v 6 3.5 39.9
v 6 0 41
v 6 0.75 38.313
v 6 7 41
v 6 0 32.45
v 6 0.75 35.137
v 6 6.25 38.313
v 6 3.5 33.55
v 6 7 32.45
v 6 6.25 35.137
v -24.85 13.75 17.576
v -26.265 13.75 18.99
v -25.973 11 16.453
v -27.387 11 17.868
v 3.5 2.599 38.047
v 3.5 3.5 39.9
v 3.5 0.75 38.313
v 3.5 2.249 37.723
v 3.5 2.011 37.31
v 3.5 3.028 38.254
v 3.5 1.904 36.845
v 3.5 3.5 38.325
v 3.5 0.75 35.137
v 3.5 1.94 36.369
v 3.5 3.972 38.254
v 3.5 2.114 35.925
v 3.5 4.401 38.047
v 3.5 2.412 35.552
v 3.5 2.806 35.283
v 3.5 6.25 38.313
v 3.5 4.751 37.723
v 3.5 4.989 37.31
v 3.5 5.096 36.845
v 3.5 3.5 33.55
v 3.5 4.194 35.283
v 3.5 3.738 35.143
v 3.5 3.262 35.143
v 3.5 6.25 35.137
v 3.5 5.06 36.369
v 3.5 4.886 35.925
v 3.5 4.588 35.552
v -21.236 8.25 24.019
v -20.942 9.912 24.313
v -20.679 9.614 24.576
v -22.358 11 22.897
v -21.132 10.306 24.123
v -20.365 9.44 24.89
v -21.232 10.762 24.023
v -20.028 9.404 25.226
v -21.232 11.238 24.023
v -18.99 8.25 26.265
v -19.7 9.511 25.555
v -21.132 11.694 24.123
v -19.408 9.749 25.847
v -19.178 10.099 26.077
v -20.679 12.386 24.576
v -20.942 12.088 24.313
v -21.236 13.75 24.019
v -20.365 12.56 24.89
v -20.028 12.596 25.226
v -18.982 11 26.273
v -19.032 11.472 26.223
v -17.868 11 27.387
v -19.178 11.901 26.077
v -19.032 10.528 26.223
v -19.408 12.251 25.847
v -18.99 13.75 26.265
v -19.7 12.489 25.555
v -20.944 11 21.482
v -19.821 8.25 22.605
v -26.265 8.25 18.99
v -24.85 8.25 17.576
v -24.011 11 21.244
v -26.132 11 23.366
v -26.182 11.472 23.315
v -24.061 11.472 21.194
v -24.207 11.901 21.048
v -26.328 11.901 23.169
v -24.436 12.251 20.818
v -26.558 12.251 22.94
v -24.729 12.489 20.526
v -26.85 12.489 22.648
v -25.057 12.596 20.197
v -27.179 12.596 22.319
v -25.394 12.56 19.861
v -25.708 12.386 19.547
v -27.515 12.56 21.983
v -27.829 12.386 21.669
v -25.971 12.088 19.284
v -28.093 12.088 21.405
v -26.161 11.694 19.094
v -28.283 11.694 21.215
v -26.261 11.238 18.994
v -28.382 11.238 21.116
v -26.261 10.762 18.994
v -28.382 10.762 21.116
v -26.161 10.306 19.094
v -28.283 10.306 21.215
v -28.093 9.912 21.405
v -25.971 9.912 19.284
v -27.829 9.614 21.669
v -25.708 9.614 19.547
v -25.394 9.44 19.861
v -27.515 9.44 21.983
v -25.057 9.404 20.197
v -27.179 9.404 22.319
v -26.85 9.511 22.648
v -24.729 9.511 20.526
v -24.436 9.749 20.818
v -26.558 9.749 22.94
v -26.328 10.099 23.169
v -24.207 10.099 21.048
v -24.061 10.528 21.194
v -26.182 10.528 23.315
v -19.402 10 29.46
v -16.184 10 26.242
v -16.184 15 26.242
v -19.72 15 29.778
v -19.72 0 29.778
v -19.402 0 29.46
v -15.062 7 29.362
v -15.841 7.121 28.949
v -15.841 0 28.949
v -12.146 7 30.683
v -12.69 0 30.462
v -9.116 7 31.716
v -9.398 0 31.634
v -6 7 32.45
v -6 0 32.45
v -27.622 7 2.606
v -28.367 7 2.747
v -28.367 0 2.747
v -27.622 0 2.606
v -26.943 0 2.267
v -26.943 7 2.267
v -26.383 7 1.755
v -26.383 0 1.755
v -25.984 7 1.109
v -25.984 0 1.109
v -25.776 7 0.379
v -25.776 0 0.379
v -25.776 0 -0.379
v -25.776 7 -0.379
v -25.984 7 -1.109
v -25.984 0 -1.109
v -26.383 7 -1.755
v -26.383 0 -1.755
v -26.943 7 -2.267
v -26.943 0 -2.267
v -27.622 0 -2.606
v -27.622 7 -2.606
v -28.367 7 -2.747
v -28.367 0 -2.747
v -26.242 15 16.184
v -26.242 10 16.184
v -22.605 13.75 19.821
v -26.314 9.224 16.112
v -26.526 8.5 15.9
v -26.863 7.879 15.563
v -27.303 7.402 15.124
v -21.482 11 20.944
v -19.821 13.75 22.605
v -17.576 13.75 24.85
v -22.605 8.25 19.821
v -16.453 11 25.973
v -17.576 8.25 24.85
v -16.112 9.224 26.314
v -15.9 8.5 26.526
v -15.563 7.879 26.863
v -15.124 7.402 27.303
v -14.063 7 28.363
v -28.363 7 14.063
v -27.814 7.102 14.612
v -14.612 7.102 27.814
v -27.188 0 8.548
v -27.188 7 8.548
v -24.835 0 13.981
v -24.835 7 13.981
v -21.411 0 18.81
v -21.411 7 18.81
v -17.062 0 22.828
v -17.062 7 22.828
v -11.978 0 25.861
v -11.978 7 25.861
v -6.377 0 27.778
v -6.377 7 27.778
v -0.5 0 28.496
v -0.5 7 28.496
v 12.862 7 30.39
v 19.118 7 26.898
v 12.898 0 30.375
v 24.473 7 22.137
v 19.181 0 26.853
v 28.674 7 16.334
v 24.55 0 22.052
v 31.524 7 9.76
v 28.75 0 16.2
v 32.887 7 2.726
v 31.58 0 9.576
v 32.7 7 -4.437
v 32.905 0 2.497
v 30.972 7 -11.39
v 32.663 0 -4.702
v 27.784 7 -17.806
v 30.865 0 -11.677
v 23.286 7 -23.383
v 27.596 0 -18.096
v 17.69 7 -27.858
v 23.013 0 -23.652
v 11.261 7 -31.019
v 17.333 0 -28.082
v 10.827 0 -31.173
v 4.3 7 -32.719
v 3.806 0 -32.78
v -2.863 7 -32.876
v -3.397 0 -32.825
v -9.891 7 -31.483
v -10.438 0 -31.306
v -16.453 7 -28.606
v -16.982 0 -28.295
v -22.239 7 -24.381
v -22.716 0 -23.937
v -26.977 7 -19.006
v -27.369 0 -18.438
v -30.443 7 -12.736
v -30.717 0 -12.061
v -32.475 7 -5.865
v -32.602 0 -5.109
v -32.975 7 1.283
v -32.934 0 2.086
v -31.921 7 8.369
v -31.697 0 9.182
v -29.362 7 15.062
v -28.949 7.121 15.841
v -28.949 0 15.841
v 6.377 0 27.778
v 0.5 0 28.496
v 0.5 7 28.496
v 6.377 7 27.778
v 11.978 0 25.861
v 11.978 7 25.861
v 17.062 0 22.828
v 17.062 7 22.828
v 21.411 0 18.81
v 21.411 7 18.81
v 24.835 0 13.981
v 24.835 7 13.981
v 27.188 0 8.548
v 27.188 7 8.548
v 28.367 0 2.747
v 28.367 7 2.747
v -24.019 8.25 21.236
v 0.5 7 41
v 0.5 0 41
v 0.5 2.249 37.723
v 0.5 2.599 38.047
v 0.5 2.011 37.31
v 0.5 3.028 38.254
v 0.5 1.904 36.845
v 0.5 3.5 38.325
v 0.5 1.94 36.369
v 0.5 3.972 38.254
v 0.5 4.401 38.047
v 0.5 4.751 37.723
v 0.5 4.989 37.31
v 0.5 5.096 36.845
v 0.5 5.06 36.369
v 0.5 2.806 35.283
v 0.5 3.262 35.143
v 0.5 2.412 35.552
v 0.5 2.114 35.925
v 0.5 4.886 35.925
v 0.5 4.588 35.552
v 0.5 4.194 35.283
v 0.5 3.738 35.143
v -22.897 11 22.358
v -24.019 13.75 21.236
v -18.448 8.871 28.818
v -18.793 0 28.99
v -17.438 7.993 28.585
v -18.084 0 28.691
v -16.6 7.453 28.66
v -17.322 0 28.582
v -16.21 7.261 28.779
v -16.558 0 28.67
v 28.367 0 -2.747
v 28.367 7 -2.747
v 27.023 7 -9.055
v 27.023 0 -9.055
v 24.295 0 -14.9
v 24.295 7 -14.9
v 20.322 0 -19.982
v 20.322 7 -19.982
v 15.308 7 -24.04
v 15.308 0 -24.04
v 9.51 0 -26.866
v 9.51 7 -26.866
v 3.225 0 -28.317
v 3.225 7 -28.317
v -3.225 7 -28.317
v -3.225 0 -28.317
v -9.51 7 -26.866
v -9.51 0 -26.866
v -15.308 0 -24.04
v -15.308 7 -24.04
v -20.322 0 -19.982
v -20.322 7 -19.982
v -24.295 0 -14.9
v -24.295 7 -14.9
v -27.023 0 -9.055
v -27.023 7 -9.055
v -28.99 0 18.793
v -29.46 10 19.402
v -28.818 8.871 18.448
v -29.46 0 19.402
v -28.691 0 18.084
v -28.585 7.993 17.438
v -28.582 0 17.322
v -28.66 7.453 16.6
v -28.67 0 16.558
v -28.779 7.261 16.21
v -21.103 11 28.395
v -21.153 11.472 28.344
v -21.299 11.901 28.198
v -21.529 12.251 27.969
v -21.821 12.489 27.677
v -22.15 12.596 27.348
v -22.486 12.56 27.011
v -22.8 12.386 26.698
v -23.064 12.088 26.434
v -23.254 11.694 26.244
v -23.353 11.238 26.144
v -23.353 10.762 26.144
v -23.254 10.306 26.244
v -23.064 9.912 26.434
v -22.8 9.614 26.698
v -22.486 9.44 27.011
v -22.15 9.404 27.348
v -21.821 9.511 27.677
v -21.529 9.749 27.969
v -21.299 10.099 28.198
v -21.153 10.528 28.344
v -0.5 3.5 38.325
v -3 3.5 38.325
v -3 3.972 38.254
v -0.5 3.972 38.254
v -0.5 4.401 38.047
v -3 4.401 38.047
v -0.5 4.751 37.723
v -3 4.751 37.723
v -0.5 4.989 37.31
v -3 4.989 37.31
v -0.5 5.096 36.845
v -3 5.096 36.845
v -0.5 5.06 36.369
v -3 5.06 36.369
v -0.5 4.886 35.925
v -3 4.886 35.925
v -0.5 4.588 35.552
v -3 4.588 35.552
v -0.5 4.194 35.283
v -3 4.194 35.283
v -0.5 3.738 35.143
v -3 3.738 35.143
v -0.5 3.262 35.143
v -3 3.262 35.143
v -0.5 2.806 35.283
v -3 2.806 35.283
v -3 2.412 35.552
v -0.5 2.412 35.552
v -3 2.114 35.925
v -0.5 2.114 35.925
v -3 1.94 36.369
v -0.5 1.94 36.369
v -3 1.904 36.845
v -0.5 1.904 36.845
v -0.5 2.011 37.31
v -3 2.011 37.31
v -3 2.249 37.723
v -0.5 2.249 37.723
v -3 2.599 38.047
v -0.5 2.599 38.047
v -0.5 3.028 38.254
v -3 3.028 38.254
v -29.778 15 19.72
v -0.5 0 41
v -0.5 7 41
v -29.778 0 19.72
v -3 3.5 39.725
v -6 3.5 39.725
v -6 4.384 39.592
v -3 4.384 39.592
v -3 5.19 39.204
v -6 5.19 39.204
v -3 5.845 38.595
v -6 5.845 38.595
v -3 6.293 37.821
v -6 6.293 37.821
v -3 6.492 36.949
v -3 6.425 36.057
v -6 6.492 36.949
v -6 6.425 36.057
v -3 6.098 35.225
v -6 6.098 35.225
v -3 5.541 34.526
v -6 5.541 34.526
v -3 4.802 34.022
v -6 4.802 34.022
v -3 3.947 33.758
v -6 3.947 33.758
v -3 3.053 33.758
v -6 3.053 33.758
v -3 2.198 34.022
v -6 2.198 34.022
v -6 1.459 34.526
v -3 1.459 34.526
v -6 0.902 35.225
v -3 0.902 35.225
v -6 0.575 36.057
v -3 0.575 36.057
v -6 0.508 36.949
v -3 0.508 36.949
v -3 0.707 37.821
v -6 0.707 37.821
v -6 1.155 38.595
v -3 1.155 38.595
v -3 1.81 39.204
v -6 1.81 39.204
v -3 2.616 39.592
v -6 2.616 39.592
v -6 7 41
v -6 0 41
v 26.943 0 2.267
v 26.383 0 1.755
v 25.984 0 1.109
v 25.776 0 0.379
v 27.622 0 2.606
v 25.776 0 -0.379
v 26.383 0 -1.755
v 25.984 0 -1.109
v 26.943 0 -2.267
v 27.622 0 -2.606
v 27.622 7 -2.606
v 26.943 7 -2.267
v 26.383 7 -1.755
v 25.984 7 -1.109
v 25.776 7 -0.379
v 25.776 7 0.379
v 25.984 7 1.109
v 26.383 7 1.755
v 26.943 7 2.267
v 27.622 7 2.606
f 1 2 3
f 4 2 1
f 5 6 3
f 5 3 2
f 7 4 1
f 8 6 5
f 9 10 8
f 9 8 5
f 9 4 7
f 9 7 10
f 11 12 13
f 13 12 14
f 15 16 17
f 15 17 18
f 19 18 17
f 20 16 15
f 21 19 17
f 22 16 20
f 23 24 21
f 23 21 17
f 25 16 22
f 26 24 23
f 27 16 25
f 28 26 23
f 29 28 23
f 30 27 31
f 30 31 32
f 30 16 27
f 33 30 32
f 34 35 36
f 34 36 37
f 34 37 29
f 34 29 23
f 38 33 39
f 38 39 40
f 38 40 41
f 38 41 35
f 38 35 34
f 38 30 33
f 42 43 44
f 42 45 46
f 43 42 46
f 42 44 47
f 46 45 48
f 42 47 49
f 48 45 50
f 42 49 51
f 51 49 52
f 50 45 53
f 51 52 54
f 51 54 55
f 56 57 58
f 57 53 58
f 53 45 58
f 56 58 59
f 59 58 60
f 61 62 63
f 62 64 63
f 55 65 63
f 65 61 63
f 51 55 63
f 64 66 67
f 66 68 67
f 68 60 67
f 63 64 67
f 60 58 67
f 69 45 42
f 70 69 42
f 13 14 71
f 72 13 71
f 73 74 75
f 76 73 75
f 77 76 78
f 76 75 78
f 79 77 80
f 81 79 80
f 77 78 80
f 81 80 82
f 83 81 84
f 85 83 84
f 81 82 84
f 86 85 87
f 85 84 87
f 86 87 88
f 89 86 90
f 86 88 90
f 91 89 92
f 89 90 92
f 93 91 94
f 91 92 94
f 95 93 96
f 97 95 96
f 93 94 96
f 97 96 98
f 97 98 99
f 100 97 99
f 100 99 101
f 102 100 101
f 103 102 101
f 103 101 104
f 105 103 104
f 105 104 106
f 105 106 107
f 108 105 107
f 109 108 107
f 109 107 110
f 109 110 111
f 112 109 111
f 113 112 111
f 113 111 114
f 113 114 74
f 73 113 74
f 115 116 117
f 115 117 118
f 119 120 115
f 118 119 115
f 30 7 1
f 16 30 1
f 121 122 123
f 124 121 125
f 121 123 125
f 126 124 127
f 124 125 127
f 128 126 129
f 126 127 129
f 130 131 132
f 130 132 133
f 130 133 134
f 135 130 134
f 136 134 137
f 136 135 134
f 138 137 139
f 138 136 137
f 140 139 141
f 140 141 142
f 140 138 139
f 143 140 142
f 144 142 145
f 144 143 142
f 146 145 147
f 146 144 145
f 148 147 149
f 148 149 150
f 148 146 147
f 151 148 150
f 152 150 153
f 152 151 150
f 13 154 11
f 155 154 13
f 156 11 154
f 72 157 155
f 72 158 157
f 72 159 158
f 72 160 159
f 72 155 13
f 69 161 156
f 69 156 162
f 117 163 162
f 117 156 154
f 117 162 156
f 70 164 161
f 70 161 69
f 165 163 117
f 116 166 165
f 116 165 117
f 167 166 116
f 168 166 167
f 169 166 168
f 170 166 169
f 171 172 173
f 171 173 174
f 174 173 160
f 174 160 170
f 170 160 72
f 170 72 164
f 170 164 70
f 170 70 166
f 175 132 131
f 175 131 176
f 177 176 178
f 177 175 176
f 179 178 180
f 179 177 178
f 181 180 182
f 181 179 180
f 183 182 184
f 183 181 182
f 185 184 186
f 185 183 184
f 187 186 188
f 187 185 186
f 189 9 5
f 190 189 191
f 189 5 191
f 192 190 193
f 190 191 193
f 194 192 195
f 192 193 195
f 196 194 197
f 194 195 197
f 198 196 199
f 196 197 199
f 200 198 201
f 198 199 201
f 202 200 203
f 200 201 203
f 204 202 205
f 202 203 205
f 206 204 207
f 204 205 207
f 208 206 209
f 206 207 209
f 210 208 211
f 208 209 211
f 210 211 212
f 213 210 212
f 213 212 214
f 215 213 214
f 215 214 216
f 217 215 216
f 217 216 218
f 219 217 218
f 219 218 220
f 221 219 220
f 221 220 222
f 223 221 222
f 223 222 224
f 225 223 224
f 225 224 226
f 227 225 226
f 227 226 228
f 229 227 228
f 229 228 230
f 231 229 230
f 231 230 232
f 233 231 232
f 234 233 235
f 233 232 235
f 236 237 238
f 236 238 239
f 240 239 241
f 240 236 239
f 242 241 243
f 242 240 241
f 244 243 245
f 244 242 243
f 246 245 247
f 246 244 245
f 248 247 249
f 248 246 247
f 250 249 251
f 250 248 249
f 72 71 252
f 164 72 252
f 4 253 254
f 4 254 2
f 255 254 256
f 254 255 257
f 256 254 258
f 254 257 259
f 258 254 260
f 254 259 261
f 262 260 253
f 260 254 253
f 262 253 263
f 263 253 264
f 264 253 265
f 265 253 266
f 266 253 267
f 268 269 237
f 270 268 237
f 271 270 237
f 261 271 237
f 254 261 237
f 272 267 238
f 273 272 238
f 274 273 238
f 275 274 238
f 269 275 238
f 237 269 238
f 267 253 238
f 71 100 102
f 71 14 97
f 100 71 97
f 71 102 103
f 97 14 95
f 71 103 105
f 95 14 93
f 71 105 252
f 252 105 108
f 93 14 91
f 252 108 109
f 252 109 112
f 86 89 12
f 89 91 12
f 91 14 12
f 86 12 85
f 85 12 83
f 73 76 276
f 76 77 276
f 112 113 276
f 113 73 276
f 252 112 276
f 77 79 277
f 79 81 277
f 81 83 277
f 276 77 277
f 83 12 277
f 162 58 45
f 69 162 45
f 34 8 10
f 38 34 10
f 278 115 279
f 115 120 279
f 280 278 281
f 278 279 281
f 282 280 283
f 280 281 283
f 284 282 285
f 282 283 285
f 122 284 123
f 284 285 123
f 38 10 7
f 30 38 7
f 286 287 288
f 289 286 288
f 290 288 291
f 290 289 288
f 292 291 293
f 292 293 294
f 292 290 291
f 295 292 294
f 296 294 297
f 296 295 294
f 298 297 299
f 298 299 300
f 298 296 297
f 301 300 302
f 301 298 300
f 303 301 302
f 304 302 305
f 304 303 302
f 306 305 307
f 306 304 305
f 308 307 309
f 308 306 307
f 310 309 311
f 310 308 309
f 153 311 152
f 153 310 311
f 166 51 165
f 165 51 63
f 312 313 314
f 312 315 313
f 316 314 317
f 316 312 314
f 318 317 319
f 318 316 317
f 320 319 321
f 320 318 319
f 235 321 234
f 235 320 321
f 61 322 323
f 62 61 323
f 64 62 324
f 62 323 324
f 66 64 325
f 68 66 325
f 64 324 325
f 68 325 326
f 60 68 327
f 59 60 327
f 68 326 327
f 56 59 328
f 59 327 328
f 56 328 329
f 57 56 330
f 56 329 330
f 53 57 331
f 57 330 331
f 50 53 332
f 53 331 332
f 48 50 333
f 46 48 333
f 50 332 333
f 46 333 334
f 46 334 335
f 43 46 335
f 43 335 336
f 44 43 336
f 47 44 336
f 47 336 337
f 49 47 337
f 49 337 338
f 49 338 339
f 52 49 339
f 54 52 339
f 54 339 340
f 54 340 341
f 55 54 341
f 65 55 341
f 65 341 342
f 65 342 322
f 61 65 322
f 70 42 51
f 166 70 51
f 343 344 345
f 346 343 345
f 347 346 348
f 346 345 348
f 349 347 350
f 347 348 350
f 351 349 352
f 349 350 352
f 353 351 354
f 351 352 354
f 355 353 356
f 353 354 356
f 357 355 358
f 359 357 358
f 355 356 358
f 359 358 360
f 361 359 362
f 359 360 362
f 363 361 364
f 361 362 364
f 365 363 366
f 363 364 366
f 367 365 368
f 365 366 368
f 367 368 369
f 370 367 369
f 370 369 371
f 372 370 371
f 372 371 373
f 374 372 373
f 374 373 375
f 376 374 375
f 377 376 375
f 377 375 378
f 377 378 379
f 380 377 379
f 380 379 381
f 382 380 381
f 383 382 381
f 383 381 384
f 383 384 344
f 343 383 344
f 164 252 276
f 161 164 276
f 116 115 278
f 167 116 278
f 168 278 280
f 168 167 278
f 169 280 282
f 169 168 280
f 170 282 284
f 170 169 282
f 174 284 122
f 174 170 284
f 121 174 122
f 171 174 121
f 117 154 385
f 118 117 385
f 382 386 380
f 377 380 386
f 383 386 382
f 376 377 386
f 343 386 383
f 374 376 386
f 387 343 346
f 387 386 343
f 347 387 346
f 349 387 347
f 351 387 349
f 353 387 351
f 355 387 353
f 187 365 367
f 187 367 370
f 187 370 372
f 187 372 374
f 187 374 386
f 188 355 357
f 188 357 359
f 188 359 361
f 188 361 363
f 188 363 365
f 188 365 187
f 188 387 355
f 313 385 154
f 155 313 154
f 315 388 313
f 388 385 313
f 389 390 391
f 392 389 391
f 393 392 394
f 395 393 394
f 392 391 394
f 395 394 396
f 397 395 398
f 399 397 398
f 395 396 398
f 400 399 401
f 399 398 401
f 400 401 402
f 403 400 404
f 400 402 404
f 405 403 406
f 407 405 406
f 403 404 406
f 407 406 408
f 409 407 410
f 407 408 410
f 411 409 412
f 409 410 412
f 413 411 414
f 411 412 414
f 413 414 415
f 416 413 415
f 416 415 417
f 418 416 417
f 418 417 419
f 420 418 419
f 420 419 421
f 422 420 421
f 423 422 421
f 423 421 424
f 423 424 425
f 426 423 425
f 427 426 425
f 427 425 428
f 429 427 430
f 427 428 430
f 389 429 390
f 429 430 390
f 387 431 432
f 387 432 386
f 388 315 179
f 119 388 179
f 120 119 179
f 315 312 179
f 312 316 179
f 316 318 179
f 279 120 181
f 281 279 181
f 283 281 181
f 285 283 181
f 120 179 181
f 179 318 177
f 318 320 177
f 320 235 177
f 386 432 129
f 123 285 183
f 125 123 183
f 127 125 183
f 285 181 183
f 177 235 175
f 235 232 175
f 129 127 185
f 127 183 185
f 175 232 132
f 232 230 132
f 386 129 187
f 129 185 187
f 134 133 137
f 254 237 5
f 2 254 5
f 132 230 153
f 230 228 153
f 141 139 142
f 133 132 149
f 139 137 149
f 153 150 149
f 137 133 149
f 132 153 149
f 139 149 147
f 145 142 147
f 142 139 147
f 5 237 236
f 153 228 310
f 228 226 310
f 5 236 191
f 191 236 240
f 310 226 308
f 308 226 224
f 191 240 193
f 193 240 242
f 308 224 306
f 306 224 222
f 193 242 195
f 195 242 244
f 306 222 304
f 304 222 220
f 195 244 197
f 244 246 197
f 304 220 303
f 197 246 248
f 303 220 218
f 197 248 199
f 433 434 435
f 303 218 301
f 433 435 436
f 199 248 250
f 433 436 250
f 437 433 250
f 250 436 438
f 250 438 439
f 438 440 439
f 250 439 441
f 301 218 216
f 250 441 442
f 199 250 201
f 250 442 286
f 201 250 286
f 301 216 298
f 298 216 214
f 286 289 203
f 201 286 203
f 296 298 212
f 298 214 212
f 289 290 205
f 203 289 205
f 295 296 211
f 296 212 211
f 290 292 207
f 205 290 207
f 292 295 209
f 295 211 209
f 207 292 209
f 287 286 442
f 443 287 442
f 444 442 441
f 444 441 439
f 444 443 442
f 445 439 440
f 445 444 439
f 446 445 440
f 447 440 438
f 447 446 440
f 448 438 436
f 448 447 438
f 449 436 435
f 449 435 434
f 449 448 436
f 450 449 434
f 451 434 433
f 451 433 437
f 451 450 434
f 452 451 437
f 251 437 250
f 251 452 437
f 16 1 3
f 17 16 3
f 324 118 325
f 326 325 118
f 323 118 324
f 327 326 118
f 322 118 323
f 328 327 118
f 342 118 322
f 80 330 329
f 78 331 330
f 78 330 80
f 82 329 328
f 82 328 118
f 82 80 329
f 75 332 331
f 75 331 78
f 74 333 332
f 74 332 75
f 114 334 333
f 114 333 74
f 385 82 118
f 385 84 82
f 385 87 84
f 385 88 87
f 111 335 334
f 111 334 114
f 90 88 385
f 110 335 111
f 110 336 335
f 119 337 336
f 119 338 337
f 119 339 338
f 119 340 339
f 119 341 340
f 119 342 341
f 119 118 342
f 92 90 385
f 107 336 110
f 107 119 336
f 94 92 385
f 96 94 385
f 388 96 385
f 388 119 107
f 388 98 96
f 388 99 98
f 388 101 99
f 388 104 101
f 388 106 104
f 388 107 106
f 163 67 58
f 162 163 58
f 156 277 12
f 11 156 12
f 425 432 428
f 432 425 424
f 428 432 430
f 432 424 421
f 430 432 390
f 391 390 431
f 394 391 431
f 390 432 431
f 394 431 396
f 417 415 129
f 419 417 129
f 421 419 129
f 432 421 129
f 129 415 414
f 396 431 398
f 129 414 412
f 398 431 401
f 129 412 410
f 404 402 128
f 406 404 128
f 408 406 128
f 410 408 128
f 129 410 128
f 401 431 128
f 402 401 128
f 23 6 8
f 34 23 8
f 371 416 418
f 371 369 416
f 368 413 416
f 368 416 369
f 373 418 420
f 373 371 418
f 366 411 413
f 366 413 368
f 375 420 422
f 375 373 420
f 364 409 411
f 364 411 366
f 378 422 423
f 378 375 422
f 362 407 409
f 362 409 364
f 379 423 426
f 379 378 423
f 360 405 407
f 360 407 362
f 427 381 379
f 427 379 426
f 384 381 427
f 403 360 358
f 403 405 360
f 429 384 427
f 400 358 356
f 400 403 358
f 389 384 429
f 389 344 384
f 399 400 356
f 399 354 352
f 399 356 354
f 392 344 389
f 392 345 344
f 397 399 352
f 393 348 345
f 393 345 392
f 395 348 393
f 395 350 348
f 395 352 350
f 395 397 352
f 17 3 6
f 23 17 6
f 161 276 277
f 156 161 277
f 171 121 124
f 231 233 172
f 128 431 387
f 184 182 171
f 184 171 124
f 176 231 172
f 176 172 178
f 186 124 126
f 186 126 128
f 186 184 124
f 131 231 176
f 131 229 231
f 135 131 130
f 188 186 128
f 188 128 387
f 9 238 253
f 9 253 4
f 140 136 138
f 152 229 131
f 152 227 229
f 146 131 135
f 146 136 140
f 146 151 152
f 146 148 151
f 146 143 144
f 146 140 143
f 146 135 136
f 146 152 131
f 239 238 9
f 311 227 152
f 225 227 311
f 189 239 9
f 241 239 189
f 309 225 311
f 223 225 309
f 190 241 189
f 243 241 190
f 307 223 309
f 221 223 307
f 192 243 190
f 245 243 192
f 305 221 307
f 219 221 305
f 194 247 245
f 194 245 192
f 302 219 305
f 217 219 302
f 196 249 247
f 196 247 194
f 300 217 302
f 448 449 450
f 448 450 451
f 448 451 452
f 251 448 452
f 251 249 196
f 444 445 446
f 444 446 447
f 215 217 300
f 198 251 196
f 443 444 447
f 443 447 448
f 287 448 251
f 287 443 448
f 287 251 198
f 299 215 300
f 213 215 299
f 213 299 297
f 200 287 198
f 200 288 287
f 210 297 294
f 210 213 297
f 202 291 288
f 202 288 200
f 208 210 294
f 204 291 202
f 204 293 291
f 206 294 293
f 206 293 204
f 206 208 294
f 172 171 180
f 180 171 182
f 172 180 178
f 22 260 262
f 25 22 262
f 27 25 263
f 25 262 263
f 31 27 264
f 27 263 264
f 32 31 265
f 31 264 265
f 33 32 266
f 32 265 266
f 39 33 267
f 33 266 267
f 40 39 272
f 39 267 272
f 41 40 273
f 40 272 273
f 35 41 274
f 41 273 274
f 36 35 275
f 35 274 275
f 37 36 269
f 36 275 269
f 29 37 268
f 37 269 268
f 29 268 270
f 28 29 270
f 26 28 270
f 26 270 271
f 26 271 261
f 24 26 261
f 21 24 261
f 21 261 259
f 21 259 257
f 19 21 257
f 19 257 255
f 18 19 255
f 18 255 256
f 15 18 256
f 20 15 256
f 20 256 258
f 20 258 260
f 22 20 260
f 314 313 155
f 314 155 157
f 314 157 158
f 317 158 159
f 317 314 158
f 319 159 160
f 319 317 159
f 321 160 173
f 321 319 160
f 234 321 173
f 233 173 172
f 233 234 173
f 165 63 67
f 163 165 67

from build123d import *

# Parameters (mm, degrees)
SKETCH1_R           = 33
SKETCH1_R_2         = 28.5
BOSS_EXTRUDE1_DEPTH = 7
SKETCH3_W           = 12
SKETCH3_H           = 9.352768828
BOSS_EXTRUDE2_DEPTH = 7
SKETCH4_R           = 3
CUT_EXTRUDE2_DEPTH  = 3
SKETCH5_R           = 1.6
CUT_EXTRUDE3_DEPTH  = 37
CUT_EXTRUDE4_DEPTH  = 2.5
SKETCH2_W           = 1
SKETCH2_H           = 30
CUT_EXTRUDE1_DEPTH  = 8
SKETCH7_R           = 2.75
BOSS_EXTRUDE3_DEPTH = 7
BOSS_EXTRUDE4_DEPTH = 15
SKETCH9_R           = 1.6
CUT_EXTRUDE5_DEPTH  = 82.669047558
CUT_EXTRUDE6_DEPTH  = 5
FILLET1_R           = 3


with BuildPart() as part:
    # Sketch1 → Boss-Extrude1 (new body)
    with BuildSketch(Plane(origin=(0, 0, 0), x_dir=(1, 0, 0), z_dir=(0, 1, 0))):
        Circle(SKETCH1_R)
        Circle(SKETCH1_R_2, mode=Mode.SUBTRACT)
    extrude(amount=BOSS_EXTRUDE1_DEPTH)

    # Sketch3 → Boss-Extrude2 (add)
    with BuildSketch(Plane(origin=(0, 7, 0), x_dir=(1, 0, 0), z_dir=(0, 1, 0))):
        with Locations((0, -36.323615586)):
            Rectangle(SKETCH3_W, SKETCH3_H)
    extrude(amount=-BOSS_EXTRUDE2_DEPTH)

    # Sketch4 → Cut-Extrude2 (cut)
    with BuildSketch(Plane.ZY.offset(6)):
        with Locations((36.72498074, 3.5)):
            Circle(SKETCH4_R)
    extrude(amount=-CUT_EXTRUDE2_DEPTH, mode=Mode.SUBTRACT)

    # Sketch5 → Cut-Extrude3 (cut, through all)
    with BuildSketch(Plane.ZY.offset(3)):
        with Locations((36.72498074, 3.5)):
            Circle(SKETCH5_R)
    extrude(amount=-CUT_EXTRUDE3_DEPTH, mode=Mode.SUBTRACT)

    # Sketch6 → Cut-Extrude4 (cut)
    with BuildSketch(Plane(origin=(6, 0, 0), x_dir=(0, 0, -1), z_dir=(1, 0, 0))):
        Polygon((-35.137267499, 0.75), (-33.549554259, 3.5), (-35.137267499, 6.25), (-38.31269398, 6.25), (-39.90040722, 3.5), (-38.31269398, 0.75), align=None)
    extrude(amount=-CUT_EXTRUDE4_DEPTH, mode=Mode.SUBTRACT)

    # Sketch2 → Cut-Extrude1 (cut, through all)
    with BuildSketch(Plane(origin=(0, 7, 0), x_dir=(1, 0, 0), z_dir=(0, 1, 0))):
        with Locations((0, -32.66005016)):
            Rectangle(SKETCH2_W, SKETCH2_H)
    extrude(amount=-CUT_EXTRUDE1_DEPTH, mode=Mode.SUBTRACT)

    # Sketch7 → Boss-Extrude3 (add)
    with BuildSketch(Plane(origin=(0, 7, 0), x_dir=(1, 0, 0), z_dir=(0, 1, 0))):
        with Locations((-28.5, 0)):
            Circle(SKETCH7_R)
        with Locations((28.5, 0)):
            Circle(SKETCH7_R)
    extrude(amount=-BOSS_EXTRUDE3_DEPTH)

    # Sketch8 → Boss-Extrude4 (add)
    with BuildSketch(Plane(origin=(0, 0, 0), x_dir=(1, 0, 0), z_dir=(0, 1, 0))):
        Polygon((-26.242146863, -16.184260008), (-16.184260008, -26.242146863), (-19.719793914, -29.777680769), (-29.777680769, -19.719793914), align=None)
    extrude(amount=BOSS_EXTRUDE4_DEPTH)

    # Sketch9 → Cut-Extrude5 (cut, through all)
    with BuildSketch(Plane(origin=(-24.748737342, 0, 24.748737342), x_dir=(0.707106781, 0, 0.707106781), z_dir=(-0.707106781, 0, 0.707106781))):
        with Locations((-3.556, 11)):
            Circle(SKETCH9_R)
        with Locations((3.556, 11)):
            Circle(SKETCH9_R)
    extrude(amount=-CUT_EXTRUDE5_DEPTH, mode=Mode.SUBTRACT)

    # Sketch10 → Cut-Extrude6 (cut)
    with BuildSketch(Plane(origin=(-22.627416998, 0, 22.627416998), x_dir=(0.707106781, 0, 0.707106781), z_dir=(-0.707106781, 0, 0.707106781))):
        Polygon((-0.380573519, 11), (-1.96828676, 13.75), (-5.14371324, 13.75), (-6.731426481, 11), (-5.14371324, 8.25), (-1.96828676, 8.25), align=None)
        Polygon((0.380573519, 11), (1.96828676, 8.25), (5.14371324, 8.25), (6.731426481, 11), (5.14371324, 13.75), (1.96828676, 13.75), align=None)
    extrude(amount=-CUT_EXTRUDE6_DEPTH, mode=Mode.SUBTRACT)

    # Fillet1
    fillet1_edges = [part.edges().sort_by_distance(p)[0] for p in [
        (-17.757230626, 3.5, 27.815117481),
        (-27.815117481, 3.5, 17.757230626),
        (-27.028632172, 7, 16.970745317),
        (-16.970745317, 7, 27.028632172),
    ]]
    fillet(fillet1_edges, radius=FILLET1_R)


solid = part.part
